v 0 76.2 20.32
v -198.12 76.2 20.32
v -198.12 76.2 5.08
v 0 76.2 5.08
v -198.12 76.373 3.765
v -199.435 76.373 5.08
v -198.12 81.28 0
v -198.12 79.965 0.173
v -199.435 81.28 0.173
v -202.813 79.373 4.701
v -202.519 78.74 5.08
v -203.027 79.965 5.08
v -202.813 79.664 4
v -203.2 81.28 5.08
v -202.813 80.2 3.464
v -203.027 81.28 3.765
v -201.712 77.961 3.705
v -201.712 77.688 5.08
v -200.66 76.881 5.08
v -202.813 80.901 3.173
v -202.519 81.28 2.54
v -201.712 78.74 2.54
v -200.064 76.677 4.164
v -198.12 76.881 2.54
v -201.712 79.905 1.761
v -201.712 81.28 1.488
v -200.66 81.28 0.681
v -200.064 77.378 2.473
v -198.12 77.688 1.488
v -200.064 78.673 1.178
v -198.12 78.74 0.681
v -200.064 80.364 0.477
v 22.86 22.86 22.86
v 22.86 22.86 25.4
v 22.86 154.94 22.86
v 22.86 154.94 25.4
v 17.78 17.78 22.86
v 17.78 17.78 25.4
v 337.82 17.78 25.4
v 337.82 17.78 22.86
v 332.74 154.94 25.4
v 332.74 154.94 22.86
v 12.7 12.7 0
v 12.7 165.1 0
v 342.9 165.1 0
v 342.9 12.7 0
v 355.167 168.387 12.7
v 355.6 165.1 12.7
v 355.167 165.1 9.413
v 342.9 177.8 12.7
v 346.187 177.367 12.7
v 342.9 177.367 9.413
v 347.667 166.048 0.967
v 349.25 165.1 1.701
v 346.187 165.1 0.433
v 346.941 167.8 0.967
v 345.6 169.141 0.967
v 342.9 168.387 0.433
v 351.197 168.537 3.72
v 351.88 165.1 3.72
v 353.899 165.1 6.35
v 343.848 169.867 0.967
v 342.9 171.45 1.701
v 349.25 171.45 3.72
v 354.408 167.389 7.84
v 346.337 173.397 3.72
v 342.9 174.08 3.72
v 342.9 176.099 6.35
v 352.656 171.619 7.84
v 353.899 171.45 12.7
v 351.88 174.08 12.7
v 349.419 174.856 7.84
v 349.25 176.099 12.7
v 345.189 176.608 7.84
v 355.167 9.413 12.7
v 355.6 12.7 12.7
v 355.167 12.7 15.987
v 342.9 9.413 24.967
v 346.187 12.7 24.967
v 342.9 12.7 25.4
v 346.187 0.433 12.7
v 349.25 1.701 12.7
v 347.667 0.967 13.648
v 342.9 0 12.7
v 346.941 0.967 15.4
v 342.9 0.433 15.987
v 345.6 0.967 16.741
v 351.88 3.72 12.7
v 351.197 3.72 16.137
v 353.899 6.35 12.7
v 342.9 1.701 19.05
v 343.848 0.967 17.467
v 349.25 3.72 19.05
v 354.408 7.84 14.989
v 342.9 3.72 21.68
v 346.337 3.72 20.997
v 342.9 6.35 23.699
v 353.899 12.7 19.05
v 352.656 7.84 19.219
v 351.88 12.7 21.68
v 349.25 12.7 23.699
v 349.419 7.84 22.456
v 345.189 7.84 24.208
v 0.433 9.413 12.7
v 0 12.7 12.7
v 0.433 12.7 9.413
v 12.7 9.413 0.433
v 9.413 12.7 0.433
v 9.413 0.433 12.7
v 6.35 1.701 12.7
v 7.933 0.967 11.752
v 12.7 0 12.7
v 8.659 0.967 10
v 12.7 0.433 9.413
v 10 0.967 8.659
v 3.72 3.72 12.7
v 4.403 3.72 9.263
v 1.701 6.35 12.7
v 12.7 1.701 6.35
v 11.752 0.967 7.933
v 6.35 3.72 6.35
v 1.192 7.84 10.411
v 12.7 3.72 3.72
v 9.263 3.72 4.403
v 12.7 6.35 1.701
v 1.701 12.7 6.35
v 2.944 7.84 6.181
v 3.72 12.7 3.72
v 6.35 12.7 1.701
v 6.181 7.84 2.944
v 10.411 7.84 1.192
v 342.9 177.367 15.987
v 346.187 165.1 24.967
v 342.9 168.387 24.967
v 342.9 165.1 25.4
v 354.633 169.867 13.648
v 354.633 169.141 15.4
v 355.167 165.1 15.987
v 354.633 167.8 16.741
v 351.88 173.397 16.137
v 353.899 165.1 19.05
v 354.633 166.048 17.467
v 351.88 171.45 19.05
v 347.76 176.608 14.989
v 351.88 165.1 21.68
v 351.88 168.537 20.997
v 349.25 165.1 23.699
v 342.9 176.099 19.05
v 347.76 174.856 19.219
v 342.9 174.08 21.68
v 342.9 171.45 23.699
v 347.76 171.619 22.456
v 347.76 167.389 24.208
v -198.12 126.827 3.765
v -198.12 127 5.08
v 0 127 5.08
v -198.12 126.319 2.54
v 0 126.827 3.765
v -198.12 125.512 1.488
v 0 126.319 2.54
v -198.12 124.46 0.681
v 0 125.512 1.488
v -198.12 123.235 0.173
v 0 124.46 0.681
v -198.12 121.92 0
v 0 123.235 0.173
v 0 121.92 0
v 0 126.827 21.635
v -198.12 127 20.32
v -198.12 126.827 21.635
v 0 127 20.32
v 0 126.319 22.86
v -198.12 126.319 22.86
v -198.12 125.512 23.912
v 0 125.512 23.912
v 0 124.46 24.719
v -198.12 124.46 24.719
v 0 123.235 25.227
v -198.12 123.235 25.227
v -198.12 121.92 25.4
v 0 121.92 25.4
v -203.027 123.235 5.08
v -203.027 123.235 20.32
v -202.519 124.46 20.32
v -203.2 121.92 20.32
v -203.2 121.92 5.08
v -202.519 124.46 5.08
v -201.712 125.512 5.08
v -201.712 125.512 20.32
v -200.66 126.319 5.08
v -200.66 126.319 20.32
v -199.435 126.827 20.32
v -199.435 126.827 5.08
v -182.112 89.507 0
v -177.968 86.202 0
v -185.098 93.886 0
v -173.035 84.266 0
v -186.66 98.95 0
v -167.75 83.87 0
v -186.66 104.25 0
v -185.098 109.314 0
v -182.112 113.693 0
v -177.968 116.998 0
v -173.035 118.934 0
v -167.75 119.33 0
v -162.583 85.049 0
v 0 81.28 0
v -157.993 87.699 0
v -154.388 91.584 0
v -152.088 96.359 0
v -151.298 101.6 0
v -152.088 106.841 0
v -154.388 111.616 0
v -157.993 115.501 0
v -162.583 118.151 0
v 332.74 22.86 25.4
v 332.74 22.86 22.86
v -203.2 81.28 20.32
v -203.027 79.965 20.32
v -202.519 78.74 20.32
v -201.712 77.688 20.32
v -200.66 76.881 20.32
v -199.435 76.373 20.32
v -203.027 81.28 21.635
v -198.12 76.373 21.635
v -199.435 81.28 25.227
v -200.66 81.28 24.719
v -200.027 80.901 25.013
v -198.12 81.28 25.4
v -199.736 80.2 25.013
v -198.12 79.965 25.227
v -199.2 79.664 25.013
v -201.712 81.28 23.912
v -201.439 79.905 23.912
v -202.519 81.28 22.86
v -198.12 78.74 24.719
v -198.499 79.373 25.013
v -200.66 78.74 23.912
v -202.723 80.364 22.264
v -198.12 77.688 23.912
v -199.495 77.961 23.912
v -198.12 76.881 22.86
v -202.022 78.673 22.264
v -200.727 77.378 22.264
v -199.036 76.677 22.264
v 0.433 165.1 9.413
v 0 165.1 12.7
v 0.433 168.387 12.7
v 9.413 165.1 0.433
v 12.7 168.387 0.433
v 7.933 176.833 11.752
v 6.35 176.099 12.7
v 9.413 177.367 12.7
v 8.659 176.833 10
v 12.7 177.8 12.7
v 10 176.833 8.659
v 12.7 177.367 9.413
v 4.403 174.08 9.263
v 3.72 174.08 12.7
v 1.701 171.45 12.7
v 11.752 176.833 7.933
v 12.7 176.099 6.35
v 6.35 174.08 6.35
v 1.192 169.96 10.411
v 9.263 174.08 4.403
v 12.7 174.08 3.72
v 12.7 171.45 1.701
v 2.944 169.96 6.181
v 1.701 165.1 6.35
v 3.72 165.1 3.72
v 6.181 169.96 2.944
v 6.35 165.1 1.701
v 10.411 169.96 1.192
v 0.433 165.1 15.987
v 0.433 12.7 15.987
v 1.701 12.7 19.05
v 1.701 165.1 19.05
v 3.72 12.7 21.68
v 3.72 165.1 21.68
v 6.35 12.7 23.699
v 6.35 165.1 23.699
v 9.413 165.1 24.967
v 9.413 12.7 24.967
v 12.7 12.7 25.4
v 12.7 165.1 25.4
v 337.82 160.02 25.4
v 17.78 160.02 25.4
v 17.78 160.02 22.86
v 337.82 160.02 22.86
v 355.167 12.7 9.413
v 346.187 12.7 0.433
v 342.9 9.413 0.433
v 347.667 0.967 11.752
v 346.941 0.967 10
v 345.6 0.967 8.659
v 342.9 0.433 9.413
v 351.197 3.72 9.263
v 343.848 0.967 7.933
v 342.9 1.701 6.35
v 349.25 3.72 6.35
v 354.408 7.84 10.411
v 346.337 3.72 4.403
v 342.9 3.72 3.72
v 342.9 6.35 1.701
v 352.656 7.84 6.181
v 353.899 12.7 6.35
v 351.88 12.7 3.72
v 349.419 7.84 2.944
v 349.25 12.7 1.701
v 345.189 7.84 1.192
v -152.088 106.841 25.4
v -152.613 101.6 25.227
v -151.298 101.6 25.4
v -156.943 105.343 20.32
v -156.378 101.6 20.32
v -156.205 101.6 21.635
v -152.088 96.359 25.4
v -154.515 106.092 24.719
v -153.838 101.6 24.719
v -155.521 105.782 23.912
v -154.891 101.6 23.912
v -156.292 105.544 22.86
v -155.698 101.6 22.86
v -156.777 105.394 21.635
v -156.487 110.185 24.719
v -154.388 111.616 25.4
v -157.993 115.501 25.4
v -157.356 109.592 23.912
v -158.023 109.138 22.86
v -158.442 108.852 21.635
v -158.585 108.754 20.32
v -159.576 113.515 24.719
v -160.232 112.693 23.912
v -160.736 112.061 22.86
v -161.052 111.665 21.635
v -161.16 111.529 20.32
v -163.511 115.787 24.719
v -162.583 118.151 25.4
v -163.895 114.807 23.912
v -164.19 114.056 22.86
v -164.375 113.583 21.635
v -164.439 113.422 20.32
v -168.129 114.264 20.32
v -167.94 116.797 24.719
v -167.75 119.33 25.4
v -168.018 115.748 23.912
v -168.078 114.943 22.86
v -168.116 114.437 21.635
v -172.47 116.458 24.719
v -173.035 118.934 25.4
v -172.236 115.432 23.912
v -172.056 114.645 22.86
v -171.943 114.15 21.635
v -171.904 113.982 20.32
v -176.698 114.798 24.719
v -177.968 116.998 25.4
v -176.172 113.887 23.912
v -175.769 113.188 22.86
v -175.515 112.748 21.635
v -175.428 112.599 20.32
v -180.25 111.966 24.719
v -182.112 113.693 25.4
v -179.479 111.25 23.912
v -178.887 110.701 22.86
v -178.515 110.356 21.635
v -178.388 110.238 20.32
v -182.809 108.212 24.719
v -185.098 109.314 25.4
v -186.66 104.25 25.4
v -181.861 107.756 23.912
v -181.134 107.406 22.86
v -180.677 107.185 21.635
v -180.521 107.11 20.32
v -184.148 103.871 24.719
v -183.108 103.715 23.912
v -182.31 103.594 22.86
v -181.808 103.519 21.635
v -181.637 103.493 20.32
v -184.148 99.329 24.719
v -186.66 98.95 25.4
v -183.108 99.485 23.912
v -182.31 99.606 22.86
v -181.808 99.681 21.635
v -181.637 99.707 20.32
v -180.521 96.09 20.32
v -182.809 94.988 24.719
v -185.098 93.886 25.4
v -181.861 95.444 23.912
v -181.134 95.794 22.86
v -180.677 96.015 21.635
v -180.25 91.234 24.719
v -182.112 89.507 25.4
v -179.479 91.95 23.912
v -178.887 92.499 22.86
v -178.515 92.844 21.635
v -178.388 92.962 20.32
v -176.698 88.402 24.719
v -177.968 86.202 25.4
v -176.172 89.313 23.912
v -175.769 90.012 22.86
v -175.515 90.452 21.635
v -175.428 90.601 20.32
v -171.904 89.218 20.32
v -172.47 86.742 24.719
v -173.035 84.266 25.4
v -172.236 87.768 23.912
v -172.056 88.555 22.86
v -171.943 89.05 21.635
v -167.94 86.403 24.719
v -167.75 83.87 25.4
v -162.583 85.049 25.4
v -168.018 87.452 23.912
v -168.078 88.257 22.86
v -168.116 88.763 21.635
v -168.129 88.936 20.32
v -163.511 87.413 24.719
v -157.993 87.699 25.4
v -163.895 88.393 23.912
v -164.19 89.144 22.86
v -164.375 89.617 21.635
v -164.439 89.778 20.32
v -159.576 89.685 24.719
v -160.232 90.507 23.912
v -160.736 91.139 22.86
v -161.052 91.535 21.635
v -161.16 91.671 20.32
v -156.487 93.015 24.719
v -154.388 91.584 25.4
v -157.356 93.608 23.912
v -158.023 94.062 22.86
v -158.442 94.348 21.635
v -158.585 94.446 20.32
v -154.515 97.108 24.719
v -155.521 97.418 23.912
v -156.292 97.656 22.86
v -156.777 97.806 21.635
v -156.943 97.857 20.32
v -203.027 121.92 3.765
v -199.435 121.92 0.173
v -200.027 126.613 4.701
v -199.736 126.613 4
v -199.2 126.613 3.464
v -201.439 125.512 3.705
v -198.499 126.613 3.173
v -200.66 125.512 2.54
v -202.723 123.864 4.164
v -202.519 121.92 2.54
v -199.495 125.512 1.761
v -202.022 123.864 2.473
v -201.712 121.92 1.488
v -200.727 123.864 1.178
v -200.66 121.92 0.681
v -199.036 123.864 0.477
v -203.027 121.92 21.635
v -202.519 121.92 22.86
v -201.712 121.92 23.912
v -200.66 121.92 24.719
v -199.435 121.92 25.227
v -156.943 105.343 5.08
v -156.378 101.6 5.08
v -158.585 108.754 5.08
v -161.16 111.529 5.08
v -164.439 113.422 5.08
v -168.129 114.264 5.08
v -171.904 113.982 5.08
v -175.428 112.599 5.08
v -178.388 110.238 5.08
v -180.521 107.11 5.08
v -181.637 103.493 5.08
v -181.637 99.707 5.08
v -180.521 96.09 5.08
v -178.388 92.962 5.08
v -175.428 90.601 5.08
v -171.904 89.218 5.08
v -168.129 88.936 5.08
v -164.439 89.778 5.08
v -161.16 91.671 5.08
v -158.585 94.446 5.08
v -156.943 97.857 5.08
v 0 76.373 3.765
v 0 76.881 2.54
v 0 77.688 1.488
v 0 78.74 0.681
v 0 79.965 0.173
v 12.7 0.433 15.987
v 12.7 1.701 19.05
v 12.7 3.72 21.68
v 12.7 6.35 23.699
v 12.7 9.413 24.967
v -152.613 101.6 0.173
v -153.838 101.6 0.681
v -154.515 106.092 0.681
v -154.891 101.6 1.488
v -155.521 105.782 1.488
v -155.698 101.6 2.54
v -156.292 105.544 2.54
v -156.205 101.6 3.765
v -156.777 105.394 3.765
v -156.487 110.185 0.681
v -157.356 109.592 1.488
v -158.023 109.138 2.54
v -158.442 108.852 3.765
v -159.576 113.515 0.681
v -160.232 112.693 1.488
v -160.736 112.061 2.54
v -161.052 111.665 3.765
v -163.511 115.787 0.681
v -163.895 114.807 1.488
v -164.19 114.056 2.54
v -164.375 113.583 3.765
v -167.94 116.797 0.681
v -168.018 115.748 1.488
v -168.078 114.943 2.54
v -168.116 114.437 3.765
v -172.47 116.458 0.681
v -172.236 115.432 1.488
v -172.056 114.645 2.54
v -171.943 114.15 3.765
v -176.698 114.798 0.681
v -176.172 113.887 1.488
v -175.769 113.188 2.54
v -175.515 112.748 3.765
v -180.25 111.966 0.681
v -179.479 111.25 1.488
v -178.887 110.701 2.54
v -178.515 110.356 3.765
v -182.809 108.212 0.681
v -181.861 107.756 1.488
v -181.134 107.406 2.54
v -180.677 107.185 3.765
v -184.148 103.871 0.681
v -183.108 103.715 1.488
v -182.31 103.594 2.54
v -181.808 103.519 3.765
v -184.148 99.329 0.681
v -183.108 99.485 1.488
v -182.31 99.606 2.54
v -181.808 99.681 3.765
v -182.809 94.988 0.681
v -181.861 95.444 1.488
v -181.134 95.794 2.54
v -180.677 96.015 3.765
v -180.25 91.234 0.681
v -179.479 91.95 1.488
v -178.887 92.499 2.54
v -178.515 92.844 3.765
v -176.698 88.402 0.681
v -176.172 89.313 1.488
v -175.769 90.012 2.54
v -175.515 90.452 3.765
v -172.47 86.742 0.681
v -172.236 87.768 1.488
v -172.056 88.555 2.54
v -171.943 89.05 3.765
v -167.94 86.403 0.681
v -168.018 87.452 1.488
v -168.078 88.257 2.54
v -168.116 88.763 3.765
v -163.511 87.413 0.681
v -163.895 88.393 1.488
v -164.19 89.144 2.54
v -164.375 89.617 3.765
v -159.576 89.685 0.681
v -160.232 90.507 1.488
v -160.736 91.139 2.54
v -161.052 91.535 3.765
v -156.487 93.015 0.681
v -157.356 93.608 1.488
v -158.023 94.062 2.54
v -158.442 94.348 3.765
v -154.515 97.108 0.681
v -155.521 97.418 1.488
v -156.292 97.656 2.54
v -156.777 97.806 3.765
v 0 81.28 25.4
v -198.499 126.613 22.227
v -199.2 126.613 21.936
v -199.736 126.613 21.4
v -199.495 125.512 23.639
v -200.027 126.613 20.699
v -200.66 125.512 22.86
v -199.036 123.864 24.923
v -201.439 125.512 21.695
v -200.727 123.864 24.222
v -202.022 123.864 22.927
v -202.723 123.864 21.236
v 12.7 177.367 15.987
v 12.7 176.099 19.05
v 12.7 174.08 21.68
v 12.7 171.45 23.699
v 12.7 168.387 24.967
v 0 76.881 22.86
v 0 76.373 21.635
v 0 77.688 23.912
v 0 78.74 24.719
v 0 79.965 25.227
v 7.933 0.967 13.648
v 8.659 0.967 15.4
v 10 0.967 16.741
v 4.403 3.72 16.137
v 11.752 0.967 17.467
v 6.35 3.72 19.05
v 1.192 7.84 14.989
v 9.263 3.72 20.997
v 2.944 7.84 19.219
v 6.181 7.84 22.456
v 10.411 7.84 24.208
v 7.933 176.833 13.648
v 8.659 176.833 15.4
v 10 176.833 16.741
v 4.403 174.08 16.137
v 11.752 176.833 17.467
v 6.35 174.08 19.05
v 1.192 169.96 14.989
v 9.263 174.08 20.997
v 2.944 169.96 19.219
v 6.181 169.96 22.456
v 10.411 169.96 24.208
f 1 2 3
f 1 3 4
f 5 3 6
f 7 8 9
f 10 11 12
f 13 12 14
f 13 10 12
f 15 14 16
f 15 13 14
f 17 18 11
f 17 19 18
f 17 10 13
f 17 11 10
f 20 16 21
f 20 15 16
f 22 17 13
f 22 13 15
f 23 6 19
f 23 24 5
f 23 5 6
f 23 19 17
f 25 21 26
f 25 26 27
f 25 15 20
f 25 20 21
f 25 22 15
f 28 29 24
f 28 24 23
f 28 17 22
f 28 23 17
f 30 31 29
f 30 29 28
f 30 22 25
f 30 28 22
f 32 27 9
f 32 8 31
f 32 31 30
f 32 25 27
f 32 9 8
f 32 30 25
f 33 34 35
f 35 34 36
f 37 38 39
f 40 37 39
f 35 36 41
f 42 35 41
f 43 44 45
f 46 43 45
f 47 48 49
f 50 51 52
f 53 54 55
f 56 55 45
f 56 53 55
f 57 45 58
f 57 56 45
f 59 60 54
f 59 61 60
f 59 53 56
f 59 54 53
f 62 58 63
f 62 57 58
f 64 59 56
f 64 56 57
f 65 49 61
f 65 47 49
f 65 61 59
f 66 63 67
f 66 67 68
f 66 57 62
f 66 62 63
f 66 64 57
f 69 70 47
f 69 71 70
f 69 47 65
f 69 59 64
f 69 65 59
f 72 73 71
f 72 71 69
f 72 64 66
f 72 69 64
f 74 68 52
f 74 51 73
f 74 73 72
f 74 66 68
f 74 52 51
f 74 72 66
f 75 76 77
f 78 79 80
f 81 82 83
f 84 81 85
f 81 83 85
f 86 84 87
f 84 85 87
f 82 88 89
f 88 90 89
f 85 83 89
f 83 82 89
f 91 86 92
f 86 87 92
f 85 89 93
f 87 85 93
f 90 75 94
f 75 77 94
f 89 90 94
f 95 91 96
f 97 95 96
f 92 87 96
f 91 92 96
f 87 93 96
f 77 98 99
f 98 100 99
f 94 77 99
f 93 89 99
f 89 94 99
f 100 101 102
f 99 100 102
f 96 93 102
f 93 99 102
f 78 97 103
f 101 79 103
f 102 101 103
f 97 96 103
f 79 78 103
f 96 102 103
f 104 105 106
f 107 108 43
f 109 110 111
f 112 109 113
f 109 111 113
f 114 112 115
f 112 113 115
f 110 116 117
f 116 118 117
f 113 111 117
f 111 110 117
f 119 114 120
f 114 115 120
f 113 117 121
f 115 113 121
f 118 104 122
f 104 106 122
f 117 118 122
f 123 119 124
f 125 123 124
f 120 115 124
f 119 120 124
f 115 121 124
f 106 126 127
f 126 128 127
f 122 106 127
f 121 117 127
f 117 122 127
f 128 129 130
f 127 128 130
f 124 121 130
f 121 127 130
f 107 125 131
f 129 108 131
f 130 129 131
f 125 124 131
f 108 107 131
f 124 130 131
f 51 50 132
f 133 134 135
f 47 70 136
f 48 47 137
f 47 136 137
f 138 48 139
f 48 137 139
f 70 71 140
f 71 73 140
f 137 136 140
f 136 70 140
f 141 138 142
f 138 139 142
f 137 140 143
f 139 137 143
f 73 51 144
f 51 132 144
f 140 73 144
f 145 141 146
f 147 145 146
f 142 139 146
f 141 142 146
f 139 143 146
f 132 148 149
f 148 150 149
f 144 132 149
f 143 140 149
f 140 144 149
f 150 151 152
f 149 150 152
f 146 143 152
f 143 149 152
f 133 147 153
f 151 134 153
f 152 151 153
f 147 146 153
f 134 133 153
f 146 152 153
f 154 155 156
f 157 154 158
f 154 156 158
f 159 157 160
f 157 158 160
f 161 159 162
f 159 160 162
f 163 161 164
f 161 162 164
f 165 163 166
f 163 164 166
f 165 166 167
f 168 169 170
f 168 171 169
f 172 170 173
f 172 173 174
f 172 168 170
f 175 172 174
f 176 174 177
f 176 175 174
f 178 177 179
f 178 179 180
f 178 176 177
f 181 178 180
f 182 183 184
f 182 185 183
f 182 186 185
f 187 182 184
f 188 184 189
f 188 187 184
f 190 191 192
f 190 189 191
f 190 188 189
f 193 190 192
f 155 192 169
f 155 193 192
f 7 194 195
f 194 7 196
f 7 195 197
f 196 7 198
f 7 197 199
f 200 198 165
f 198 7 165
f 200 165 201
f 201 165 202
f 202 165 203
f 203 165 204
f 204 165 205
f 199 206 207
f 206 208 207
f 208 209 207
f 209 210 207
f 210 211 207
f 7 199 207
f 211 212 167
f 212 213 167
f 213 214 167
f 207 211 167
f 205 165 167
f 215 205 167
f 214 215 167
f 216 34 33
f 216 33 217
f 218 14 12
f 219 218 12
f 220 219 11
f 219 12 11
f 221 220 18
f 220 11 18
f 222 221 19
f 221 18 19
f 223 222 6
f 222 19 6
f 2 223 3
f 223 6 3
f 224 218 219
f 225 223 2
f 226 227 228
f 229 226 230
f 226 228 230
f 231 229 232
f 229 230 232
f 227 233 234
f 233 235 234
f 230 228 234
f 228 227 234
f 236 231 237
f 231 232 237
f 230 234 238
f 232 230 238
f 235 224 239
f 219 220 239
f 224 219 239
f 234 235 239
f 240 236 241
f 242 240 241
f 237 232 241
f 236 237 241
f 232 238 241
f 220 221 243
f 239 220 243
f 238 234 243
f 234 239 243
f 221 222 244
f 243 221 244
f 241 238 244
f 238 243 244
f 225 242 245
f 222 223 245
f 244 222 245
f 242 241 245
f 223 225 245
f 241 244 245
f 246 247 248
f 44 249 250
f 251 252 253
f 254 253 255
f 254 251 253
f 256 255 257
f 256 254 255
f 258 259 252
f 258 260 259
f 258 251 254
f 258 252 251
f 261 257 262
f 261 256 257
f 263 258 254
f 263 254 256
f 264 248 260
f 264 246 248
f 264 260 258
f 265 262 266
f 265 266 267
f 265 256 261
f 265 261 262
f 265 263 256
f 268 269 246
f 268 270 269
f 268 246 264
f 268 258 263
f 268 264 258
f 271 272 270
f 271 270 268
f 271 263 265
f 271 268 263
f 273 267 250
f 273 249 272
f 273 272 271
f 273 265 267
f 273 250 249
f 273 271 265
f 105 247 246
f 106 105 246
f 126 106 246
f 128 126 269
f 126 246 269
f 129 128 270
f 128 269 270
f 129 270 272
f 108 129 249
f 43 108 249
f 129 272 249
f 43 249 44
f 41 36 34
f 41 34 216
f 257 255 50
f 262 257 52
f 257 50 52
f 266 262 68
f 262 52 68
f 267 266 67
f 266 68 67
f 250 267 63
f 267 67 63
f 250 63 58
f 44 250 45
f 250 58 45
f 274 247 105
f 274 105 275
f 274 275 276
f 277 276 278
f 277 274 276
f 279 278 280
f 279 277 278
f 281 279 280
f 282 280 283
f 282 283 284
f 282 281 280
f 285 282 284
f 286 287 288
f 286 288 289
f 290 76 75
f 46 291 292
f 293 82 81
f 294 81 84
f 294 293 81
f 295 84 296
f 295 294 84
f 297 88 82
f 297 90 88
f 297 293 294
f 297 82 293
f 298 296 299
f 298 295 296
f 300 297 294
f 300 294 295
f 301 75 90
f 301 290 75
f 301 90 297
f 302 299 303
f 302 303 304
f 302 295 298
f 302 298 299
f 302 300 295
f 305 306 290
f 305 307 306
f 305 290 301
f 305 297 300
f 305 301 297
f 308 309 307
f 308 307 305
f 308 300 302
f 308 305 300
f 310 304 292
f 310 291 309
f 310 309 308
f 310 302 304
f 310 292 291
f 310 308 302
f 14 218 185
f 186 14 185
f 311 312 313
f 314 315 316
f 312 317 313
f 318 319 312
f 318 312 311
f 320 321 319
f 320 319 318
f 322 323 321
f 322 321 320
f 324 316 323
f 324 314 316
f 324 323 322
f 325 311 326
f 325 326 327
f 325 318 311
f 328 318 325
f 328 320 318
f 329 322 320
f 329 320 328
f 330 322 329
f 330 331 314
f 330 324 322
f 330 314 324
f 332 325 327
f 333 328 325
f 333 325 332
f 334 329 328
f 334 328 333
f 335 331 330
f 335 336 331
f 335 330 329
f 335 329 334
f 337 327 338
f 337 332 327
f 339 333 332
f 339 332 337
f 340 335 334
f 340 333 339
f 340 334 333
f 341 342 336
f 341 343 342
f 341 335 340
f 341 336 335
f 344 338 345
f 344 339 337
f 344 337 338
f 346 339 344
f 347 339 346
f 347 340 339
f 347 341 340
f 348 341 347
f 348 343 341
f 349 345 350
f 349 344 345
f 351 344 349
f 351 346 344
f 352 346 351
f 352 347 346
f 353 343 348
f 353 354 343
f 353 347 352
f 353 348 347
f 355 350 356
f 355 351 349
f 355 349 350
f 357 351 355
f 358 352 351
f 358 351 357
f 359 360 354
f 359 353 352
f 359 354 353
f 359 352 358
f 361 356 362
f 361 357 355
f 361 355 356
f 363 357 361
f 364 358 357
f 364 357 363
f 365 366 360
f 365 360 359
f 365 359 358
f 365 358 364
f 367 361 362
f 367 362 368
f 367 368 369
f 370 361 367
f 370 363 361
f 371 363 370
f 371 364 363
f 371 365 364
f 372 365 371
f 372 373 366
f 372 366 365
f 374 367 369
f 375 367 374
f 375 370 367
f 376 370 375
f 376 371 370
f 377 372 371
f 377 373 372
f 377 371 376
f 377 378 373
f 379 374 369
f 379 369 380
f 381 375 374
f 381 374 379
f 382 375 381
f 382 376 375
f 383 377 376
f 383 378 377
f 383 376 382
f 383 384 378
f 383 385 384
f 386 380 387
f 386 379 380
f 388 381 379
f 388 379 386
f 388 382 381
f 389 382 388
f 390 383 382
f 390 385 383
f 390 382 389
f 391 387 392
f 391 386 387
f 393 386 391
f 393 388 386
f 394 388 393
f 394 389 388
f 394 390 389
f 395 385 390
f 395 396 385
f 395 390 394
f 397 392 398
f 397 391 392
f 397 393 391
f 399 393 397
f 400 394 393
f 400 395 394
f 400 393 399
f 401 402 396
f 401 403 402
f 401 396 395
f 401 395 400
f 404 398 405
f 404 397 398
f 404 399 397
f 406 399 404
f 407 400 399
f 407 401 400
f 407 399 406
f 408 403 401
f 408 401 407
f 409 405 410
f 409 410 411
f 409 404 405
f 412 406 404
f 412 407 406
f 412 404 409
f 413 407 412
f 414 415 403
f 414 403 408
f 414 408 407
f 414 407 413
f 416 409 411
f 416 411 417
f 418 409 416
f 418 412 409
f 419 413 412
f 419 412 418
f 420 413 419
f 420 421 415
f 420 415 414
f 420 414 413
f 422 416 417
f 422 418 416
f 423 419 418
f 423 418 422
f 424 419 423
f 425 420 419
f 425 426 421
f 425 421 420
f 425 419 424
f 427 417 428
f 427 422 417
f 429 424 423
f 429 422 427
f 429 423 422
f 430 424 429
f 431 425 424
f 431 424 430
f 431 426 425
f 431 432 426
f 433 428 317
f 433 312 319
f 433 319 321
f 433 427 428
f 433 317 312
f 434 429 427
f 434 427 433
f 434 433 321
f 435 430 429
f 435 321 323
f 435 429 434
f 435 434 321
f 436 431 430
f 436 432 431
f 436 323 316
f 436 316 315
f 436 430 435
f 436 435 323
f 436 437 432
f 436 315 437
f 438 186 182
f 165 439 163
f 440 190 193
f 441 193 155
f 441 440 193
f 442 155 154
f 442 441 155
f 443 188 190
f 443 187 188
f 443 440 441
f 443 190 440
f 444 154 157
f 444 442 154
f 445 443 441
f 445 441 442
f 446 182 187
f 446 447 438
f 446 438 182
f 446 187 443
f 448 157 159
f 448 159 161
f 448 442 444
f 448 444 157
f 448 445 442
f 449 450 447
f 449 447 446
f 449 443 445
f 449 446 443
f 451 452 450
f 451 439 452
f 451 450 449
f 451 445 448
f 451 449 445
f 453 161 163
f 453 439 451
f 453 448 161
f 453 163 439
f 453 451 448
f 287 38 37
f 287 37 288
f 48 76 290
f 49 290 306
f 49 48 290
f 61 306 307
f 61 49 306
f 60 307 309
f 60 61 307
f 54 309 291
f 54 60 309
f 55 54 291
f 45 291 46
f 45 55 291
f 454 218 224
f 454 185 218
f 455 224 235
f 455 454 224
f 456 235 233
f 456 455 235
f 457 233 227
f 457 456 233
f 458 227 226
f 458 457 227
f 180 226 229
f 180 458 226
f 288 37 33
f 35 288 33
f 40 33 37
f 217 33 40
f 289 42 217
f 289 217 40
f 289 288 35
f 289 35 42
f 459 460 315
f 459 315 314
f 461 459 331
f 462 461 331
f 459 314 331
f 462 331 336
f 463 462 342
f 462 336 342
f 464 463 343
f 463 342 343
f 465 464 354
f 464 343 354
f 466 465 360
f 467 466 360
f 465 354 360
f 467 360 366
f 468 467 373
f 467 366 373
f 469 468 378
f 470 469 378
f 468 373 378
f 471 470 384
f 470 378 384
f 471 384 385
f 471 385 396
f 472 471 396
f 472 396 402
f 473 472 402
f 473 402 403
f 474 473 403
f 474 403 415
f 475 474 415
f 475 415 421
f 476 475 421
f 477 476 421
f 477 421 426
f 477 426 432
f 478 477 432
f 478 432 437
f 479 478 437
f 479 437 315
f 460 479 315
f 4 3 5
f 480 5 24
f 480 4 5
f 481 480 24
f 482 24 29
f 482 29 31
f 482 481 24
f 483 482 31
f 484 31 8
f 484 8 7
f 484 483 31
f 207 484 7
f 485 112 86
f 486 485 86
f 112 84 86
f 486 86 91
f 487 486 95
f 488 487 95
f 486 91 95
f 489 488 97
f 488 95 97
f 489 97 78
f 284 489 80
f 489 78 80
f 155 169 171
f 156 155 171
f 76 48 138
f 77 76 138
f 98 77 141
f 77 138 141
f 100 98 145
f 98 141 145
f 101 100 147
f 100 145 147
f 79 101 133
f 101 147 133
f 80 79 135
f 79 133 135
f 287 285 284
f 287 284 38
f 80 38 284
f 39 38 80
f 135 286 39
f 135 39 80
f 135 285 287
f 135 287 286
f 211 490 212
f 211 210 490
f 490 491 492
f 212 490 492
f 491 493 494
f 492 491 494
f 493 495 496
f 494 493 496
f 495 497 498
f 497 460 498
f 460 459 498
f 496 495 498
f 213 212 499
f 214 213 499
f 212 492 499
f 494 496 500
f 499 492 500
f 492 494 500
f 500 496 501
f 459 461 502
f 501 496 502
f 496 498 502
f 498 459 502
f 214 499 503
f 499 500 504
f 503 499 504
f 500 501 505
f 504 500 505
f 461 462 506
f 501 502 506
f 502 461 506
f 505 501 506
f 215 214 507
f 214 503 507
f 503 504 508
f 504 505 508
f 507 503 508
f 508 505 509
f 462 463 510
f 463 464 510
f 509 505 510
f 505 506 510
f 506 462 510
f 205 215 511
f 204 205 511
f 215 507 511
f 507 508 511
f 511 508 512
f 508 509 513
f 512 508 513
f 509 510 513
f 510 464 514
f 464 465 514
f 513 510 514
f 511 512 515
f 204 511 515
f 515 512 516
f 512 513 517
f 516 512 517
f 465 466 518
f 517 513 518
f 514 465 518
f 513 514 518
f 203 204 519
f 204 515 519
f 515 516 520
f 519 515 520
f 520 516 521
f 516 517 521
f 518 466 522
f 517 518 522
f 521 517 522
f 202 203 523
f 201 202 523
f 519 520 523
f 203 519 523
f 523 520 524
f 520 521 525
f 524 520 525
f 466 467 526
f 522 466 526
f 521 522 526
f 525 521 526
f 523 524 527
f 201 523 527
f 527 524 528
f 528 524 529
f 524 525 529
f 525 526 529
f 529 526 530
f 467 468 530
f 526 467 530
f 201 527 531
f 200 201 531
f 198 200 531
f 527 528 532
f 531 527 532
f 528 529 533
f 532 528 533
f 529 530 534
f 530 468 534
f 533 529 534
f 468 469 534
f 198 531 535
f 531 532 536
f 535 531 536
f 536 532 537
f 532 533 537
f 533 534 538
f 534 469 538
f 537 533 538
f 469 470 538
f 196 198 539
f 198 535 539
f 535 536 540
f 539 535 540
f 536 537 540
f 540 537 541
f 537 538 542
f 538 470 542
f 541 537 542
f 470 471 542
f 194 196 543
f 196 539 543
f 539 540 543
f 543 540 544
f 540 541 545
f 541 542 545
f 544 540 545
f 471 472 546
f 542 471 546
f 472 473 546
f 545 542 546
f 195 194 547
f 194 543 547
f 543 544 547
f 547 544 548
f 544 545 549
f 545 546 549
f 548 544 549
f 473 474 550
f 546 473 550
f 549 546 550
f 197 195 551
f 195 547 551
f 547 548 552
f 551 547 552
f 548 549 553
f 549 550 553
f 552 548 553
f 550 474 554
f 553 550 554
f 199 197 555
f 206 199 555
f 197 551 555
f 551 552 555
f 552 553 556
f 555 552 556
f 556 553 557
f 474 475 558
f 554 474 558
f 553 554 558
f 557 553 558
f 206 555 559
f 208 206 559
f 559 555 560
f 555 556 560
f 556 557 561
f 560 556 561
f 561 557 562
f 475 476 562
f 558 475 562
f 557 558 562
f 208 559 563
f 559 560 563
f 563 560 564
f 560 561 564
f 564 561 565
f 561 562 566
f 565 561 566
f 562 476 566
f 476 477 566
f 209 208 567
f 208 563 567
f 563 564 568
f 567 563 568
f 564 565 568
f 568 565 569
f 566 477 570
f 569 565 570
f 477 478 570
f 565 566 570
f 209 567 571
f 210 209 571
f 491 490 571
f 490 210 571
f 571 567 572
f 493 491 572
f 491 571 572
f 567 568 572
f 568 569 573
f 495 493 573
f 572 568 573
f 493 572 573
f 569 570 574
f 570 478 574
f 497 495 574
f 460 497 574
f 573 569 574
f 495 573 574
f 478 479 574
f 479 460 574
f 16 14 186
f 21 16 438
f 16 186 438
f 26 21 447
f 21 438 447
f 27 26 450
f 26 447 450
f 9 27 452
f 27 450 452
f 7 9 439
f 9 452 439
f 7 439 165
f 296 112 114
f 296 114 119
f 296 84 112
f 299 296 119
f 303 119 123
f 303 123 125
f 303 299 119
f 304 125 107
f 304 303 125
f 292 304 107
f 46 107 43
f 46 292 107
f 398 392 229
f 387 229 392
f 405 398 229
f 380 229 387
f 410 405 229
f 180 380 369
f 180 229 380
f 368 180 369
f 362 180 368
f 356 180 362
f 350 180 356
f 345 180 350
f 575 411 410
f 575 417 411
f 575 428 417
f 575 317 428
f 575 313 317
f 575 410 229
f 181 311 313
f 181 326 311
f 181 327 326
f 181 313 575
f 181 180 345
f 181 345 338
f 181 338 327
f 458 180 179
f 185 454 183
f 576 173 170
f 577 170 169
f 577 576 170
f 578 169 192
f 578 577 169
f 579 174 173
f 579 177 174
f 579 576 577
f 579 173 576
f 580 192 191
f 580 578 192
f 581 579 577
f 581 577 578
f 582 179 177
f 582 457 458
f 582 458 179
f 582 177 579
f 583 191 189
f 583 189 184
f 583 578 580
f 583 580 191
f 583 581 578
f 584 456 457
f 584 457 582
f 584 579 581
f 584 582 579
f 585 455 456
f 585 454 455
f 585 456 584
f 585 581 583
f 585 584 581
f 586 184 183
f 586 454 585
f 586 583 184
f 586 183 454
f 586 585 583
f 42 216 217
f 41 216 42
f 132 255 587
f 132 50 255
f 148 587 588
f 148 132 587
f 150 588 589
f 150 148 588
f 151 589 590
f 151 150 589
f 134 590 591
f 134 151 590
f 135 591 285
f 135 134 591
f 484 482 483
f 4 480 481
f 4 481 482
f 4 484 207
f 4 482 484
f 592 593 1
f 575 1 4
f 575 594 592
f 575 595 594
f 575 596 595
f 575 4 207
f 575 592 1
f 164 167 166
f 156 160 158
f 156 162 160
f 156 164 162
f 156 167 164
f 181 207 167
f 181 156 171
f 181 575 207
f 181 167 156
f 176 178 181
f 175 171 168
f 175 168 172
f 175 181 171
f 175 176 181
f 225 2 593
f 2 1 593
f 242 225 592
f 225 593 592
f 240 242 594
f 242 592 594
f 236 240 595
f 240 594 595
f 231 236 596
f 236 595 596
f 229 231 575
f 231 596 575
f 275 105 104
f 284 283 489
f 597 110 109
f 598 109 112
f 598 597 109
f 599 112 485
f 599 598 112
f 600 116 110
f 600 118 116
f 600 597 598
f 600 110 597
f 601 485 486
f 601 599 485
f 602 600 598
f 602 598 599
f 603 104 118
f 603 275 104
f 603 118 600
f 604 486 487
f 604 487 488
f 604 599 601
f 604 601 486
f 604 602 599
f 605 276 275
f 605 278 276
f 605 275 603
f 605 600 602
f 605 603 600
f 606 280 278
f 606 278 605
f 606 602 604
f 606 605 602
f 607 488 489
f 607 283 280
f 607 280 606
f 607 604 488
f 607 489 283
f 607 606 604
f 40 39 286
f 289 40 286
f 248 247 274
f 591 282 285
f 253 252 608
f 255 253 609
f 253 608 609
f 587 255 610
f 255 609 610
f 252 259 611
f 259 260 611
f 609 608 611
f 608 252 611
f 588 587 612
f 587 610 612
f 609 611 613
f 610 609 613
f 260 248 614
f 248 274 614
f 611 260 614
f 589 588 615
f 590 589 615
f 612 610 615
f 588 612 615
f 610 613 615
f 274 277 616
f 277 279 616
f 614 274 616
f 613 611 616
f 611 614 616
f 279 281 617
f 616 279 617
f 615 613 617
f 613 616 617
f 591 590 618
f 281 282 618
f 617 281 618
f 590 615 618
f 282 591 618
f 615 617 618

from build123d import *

# Parameters (mm, degrees)
F0_W     = 355.6
F0_H     = 177.8
F1_DEPTH = 25.4
F2_W     = 203.2
F2_H     = 50.8
F3_DEPTH = 25.4
F4_R     = 12.7
F5_DEPTH = 25.401
F6_R     = 5.08
F7_R     = 12.69999
F8_W     = 320.04
F8_H     = 142.24
F8_W_2   = 309.88
F8_H_2   = 132.08
F9_DEPTH = 2.54


# Not quite as in the source:
# - a fillet or chamfer is up to 0.001 mm smaller than in the source, because OpenCascade refuses the exact size


with BuildPart() as f1:
    # F0 (on Top) → F1 (new body)
    with BuildSketch(Plane.XY):
        with Locations((177.8, 88.9)):
            Rectangle(F0_W, F0_H)
    extrude(amount=F1_DEPTH)

    # F7 (radius 12.7 in the source; OpenCascade refuses exactly that, so slightly less here)
    f7_edges = [f1.edges().sort_by_distance(p)[0] for p in [
        (0, 88.9, 25.4),
        (0, 88.9, 0),
        (0, 177.8, 12.7),
        (177.8, 177.8, 25.4),
        (355.6, 177.8, 12.7),
        (355.6, 88.9, 0),
        (355.6, 88.9, 25.4),
        (0, 0, 12.7),
        (355.6, 0, 12.7),
        (177.8, 0, 0),
        (177.8, 0, 25.4),
        (177.8, 177.8, 0),
    ]]
    fillet(f7_edges, radius=F7_R)

    # F8 (on face) → F9 (cut)
    with BuildSketch(Plane.XY.offset(25.4)):
        with Locations((177.8, 88.9)):
            Rectangle(F8_W, F8_H)
        with Locations((177.8, 88.9)):
            Rectangle(F8_W_2, F8_H_2, mode=Mode.SUBTRACT)
    extrude(amount=-F9_DEPTH, mode=Mode.SUBTRACT)


with BuildPart() as f3:
    # F2 (on face) → F3 (new body)
    with BuildSketch(Plane.XY.offset(25.4)):
        with Locations((-101.6, 101.6)):
            Rectangle(F2_W, F2_H)
    extrude(amount=-F3_DEPTH)

    # F4 (on face) → F5 (cut, through all)
    with BuildSketch(Plane.XY.offset(25.4)):
        with Locations((-169.0784096718, 101.6)):
            Circle(F4_R)
    extrude(amount=-F5_DEPTH, mode=Mode.SUBTRACT)

    # F6
    f6_edges = [f3.edges().sort_by_distance(p)[0] for p in [
        (-181.77841, 101.6, 25.4),
        (-181.77841, 101.6, 0),
        (-101.6, 76.2, 0),
        (-203.2, 76.2, 12.7),
        (-203.2, 101.6, 0),
        (-203.2, 101.6, 25.4),
        (-101.6, 127, 25.4),
        (-203.2, 127, 12.7),
        (-101.6, 127, 0),
        (-101.6, 76.2, 25.4),
    ]]
    fillet(f6_edges, radius=F6_R)


solid = Compound([f1.part, f3.part])
